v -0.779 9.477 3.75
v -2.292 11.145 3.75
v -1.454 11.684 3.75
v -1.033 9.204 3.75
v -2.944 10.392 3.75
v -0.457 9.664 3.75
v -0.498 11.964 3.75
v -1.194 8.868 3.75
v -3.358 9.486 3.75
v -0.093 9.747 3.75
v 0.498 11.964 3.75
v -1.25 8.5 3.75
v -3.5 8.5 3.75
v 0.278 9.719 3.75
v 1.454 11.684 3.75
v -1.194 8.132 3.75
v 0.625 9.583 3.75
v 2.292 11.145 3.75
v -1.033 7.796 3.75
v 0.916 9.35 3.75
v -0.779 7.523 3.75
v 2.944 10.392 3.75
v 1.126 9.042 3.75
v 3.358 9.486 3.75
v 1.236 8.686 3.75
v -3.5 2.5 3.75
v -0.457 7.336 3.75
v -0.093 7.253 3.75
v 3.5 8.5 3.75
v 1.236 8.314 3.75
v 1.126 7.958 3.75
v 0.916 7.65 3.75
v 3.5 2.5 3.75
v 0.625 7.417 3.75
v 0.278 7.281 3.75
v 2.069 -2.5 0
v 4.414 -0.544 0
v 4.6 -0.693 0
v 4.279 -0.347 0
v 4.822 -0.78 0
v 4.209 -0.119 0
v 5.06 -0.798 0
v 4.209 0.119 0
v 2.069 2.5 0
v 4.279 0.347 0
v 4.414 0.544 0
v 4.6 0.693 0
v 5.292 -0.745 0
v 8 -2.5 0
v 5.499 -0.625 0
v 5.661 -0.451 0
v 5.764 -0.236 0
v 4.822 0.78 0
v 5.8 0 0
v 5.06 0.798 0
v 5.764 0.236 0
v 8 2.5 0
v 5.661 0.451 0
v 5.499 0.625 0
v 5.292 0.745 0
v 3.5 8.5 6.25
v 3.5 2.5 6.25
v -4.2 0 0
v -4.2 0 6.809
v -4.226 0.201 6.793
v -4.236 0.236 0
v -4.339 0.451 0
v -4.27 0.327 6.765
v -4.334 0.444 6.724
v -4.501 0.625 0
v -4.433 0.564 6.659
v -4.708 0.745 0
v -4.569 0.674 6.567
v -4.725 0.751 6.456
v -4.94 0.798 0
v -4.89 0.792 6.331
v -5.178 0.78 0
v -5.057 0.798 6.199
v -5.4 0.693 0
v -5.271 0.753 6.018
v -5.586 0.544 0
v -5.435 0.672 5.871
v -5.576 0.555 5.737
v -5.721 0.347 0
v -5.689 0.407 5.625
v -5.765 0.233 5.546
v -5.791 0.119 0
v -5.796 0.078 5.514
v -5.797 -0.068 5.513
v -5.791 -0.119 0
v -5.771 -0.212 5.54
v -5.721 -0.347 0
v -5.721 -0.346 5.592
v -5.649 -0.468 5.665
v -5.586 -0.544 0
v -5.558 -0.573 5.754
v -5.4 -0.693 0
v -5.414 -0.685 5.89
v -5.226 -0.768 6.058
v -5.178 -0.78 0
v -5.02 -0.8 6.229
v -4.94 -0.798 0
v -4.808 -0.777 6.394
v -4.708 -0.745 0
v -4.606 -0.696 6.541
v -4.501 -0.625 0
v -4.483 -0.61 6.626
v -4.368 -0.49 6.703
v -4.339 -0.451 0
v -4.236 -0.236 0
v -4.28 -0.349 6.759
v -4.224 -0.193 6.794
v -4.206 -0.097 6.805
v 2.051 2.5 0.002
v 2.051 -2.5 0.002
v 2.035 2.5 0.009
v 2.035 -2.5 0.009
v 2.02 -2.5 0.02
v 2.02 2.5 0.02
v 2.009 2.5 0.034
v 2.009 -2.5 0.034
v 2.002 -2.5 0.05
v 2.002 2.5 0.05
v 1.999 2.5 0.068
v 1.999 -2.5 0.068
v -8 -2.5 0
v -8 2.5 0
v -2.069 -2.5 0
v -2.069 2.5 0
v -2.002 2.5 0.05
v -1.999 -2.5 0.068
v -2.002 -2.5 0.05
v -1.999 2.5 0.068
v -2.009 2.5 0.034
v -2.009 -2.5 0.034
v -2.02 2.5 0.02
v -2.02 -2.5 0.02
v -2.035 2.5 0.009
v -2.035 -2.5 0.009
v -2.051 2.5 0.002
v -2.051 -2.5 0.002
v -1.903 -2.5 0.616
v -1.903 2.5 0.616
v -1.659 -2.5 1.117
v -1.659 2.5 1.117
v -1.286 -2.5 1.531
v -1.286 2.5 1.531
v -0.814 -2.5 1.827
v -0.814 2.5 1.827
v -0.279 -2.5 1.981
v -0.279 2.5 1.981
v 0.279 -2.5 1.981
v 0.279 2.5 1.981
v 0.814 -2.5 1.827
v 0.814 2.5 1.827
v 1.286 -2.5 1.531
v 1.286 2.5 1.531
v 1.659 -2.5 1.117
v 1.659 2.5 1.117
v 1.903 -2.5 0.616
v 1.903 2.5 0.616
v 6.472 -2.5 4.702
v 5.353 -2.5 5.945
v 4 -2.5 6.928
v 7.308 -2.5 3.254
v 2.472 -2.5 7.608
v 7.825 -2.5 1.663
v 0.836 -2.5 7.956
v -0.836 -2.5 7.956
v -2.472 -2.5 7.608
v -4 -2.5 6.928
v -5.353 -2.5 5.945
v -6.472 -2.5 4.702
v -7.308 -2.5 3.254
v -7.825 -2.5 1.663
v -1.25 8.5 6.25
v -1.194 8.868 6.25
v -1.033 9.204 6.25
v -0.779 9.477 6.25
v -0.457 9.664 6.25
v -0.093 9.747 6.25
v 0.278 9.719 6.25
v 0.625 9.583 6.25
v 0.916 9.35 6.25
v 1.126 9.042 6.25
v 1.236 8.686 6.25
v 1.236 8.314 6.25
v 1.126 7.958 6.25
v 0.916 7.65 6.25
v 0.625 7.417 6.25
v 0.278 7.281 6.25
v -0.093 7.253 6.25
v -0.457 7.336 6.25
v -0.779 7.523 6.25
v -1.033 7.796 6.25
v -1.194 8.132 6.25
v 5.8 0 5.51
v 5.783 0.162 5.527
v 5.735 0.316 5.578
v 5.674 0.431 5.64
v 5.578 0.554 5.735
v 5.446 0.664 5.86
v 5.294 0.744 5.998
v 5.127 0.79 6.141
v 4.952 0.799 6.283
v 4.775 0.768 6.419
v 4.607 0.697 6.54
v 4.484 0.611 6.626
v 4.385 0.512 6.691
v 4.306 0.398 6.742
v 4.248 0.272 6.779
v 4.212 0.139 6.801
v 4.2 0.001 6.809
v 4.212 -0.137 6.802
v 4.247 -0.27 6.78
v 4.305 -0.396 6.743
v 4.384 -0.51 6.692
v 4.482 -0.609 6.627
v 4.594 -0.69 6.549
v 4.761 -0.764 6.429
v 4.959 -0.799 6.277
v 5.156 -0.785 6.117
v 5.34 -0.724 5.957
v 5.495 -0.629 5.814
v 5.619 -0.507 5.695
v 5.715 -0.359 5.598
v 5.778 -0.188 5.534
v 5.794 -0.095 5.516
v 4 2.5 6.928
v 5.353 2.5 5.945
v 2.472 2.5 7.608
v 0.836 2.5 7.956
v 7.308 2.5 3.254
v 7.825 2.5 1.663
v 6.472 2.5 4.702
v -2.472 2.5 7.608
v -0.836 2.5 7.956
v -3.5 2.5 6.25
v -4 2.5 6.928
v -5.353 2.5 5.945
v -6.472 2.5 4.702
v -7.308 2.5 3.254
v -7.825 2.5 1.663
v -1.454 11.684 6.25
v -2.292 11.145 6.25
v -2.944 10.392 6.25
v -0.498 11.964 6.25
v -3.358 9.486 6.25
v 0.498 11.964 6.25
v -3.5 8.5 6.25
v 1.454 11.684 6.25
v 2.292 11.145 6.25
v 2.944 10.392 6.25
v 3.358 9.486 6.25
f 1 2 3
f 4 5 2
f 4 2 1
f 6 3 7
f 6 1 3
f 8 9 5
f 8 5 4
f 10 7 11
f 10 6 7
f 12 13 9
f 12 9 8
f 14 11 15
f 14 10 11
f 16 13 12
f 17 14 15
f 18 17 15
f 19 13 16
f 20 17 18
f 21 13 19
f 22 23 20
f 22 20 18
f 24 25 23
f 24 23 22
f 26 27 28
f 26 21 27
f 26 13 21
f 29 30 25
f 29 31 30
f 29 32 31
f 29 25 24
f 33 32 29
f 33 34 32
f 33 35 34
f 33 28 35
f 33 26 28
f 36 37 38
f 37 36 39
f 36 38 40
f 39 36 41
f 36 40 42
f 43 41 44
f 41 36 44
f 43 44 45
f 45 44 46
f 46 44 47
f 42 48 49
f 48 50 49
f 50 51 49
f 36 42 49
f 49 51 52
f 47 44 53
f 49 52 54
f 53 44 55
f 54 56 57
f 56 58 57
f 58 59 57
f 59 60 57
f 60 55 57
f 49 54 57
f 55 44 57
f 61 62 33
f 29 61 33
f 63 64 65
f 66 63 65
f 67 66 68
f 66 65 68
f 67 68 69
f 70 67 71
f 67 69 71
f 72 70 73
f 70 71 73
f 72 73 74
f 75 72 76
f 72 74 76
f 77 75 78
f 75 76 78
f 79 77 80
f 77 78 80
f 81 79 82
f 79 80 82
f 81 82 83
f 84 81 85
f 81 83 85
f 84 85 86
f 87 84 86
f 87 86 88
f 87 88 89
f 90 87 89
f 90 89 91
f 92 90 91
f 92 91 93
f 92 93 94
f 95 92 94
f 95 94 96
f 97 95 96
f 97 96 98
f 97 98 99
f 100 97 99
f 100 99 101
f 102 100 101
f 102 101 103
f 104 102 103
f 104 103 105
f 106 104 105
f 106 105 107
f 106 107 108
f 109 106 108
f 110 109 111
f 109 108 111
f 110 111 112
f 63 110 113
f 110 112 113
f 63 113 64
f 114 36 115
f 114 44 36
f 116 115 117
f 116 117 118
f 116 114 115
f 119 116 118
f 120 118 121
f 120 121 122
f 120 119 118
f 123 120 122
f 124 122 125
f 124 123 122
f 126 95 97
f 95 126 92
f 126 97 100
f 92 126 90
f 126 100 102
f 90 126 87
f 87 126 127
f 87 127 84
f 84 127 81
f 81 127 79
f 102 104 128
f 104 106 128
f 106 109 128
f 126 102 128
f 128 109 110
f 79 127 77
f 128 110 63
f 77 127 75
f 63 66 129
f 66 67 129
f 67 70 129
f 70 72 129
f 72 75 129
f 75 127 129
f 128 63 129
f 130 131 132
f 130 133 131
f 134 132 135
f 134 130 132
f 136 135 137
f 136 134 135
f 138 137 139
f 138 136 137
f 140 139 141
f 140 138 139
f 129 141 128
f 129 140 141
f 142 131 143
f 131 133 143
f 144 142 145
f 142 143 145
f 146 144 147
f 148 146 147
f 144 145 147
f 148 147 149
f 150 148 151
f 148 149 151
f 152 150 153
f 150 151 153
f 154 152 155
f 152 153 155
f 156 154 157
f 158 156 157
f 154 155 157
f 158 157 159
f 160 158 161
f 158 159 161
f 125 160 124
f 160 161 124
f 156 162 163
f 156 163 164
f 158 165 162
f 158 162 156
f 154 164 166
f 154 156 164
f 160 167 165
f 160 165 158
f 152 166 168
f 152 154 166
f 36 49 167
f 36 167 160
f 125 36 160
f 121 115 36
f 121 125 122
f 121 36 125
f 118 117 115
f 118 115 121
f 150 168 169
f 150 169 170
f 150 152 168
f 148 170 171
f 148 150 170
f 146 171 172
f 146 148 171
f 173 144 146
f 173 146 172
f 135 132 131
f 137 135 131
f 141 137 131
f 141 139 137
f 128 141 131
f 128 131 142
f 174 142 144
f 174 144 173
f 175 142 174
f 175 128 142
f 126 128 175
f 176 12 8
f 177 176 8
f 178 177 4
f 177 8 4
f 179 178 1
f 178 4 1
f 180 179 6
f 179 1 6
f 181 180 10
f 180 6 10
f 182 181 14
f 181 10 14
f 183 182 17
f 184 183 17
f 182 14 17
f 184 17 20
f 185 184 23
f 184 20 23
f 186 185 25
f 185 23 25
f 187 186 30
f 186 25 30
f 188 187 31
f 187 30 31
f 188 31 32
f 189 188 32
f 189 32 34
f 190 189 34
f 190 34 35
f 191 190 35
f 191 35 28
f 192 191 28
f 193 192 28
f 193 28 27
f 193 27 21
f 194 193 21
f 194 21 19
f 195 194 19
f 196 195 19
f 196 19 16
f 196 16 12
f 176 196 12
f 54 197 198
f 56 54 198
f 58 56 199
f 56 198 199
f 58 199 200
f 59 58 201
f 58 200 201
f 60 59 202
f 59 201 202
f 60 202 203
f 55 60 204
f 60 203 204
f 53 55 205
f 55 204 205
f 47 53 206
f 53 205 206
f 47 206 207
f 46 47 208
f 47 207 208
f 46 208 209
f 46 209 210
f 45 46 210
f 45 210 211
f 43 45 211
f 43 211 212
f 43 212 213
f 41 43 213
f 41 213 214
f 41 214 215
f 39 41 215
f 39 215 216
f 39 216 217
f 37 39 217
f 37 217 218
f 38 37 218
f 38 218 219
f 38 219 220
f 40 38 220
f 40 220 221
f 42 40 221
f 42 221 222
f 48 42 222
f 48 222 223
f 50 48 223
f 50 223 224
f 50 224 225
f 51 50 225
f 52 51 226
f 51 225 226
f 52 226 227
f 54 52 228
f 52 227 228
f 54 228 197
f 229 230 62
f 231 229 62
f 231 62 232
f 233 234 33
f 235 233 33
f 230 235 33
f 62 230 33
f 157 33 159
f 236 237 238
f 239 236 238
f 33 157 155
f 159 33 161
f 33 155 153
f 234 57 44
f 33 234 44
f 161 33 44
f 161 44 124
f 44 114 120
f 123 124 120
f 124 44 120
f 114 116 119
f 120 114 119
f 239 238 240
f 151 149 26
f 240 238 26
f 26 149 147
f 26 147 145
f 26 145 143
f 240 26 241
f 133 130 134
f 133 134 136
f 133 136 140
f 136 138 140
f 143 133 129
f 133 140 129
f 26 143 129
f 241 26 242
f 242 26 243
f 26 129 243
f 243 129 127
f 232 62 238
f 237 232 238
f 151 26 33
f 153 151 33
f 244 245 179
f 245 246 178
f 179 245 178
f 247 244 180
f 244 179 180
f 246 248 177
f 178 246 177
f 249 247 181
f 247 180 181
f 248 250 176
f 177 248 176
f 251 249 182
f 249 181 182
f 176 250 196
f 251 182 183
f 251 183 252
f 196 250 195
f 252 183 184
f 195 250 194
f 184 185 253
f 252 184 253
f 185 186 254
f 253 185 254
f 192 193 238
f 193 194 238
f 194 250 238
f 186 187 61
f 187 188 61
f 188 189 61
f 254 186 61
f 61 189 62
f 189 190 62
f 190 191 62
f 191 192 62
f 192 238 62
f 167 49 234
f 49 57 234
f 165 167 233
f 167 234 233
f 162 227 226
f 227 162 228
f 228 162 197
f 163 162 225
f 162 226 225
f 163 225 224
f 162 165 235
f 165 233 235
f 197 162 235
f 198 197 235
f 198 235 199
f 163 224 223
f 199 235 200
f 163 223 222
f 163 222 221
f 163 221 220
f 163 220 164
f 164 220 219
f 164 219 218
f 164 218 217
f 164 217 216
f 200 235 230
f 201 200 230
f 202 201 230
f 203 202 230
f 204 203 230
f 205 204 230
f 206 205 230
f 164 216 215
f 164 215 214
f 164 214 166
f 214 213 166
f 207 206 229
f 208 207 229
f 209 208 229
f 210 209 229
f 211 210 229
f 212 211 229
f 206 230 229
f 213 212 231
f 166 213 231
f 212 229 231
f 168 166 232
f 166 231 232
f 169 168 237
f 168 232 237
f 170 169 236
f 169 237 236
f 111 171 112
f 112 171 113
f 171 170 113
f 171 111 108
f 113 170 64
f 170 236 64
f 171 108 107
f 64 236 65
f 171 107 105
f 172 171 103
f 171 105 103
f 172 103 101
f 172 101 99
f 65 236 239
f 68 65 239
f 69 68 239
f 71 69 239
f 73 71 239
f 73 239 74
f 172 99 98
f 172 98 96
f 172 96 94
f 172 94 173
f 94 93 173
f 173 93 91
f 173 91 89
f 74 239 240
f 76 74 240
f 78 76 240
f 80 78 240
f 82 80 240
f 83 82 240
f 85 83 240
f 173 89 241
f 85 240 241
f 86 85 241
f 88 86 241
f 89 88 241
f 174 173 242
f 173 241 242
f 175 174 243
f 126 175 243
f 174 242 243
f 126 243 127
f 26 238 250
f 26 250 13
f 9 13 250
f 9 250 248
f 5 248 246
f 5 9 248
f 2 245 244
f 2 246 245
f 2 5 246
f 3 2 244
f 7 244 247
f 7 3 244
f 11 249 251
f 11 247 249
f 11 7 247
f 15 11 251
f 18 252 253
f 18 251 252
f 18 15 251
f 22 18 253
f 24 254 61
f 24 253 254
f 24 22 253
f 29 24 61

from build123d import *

# Parameters (mm, degrees)
BOSS_EXTRUDE1_DEPTH   = 2.5
SKETCH2_W             = 7
SKETCH2_H             = 2.5
BOSS_EXTRUDE2_DEPTH   = 9.5
CUT_EXTRUDE1_DEPTH    = 9.5
SKETCH4_R             = 1.25
CUT_EXTRUDE2_DEPTH    = 9.5
M2X0_4_TAPPED_HOLE1_D = 1.6
FILLET1_R             = 0.07


with BuildPart() as part:
    # Sketch1 → Boss-Extrude1 (new body, symmetric)
    with BuildSketch(Plane(origin=(0, 0, 0), x_dir=(1, 0, 0), z_dir=(0, 1, 0))):
        with BuildLine():
            Line((2, 0), (8, 0))
            ThreePointArc((8, 0), (0, -8), (-8, 0))
            Line((-8, 0), (-2, 0))
            ThreePointArc((-2, 0), (0, -2), (2, 0))
        make_face()
    extrude(amount=BOSS_EXTRUDE1_DEPTH, both=True)

    # Sketch2 → Boss-Extrude2 (add)
    with BuildSketch(Plane(origin=(0, 2.5, 0), x_dir=(1, 0, 0), z_dir=(0, 1, 0))):
        with Locations((0, -5)):
            Rectangle(SKETCH2_W, SKETCH2_H)
    extrude(amount=BOSS_EXTRUDE2_DEPTH)

    # Sketch3 → Cut-Extrude1 (cut)
    with BuildSketch(Plane(origin=(0, 0, 3.75), x_dir=(-1, 0, 0), z_dir=(0, 0, -1))):
        with BuildLine():
            Line((-3.5, 8.5), (-3.5, 14.886359519))
            Line((-3.5, 14.886359519), (0, 16.809201746))
            Line((0, 16.809201746), (3.5, 14.5))
            Line((3.5, 14.5), (3.5, 8.5))
            ThreePointArc((3.5, 8.5), (0, 12), (-3.5, 8.5))
        make_face()
    extrude(amount=-CUT_EXTRUDE1_DEPTH, mode=Mode.SUBTRACT)

    # Sketch4 → Cut-Extrude2 (cut)
    with BuildSketch(Plane(origin=(0, 0, 3.75), x_dir=(-1, 0, 0), z_dir=(0, 0, -1))):
        with Locations((0, 8.5)):
            Circle(SKETCH4_R)
    extrude(amount=-CUT_EXTRUDE2_DEPTH, mode=Mode.SUBTRACT)

    # M2x0.4 Tapped Hole1 (through all)
    with Locations(Plane(origin=(0, 0, 0), x_dir=(-1, 0, 0), z_dir=(0, 0, -1))):
        with Locations((-5, 0), (5, 0)):
            Hole(M2X0_4_TAPPED_HOLE1_D / 2)

    # Fillet1
    fillet1_edges = [part.edges().sort_by_distance(p)[0] for p in [
        (2, 0, 0),
        (-2, 0, 0),
    ]]
    fillet(fillet1_edges, radius=FILLET1_R)


solid = part.part
